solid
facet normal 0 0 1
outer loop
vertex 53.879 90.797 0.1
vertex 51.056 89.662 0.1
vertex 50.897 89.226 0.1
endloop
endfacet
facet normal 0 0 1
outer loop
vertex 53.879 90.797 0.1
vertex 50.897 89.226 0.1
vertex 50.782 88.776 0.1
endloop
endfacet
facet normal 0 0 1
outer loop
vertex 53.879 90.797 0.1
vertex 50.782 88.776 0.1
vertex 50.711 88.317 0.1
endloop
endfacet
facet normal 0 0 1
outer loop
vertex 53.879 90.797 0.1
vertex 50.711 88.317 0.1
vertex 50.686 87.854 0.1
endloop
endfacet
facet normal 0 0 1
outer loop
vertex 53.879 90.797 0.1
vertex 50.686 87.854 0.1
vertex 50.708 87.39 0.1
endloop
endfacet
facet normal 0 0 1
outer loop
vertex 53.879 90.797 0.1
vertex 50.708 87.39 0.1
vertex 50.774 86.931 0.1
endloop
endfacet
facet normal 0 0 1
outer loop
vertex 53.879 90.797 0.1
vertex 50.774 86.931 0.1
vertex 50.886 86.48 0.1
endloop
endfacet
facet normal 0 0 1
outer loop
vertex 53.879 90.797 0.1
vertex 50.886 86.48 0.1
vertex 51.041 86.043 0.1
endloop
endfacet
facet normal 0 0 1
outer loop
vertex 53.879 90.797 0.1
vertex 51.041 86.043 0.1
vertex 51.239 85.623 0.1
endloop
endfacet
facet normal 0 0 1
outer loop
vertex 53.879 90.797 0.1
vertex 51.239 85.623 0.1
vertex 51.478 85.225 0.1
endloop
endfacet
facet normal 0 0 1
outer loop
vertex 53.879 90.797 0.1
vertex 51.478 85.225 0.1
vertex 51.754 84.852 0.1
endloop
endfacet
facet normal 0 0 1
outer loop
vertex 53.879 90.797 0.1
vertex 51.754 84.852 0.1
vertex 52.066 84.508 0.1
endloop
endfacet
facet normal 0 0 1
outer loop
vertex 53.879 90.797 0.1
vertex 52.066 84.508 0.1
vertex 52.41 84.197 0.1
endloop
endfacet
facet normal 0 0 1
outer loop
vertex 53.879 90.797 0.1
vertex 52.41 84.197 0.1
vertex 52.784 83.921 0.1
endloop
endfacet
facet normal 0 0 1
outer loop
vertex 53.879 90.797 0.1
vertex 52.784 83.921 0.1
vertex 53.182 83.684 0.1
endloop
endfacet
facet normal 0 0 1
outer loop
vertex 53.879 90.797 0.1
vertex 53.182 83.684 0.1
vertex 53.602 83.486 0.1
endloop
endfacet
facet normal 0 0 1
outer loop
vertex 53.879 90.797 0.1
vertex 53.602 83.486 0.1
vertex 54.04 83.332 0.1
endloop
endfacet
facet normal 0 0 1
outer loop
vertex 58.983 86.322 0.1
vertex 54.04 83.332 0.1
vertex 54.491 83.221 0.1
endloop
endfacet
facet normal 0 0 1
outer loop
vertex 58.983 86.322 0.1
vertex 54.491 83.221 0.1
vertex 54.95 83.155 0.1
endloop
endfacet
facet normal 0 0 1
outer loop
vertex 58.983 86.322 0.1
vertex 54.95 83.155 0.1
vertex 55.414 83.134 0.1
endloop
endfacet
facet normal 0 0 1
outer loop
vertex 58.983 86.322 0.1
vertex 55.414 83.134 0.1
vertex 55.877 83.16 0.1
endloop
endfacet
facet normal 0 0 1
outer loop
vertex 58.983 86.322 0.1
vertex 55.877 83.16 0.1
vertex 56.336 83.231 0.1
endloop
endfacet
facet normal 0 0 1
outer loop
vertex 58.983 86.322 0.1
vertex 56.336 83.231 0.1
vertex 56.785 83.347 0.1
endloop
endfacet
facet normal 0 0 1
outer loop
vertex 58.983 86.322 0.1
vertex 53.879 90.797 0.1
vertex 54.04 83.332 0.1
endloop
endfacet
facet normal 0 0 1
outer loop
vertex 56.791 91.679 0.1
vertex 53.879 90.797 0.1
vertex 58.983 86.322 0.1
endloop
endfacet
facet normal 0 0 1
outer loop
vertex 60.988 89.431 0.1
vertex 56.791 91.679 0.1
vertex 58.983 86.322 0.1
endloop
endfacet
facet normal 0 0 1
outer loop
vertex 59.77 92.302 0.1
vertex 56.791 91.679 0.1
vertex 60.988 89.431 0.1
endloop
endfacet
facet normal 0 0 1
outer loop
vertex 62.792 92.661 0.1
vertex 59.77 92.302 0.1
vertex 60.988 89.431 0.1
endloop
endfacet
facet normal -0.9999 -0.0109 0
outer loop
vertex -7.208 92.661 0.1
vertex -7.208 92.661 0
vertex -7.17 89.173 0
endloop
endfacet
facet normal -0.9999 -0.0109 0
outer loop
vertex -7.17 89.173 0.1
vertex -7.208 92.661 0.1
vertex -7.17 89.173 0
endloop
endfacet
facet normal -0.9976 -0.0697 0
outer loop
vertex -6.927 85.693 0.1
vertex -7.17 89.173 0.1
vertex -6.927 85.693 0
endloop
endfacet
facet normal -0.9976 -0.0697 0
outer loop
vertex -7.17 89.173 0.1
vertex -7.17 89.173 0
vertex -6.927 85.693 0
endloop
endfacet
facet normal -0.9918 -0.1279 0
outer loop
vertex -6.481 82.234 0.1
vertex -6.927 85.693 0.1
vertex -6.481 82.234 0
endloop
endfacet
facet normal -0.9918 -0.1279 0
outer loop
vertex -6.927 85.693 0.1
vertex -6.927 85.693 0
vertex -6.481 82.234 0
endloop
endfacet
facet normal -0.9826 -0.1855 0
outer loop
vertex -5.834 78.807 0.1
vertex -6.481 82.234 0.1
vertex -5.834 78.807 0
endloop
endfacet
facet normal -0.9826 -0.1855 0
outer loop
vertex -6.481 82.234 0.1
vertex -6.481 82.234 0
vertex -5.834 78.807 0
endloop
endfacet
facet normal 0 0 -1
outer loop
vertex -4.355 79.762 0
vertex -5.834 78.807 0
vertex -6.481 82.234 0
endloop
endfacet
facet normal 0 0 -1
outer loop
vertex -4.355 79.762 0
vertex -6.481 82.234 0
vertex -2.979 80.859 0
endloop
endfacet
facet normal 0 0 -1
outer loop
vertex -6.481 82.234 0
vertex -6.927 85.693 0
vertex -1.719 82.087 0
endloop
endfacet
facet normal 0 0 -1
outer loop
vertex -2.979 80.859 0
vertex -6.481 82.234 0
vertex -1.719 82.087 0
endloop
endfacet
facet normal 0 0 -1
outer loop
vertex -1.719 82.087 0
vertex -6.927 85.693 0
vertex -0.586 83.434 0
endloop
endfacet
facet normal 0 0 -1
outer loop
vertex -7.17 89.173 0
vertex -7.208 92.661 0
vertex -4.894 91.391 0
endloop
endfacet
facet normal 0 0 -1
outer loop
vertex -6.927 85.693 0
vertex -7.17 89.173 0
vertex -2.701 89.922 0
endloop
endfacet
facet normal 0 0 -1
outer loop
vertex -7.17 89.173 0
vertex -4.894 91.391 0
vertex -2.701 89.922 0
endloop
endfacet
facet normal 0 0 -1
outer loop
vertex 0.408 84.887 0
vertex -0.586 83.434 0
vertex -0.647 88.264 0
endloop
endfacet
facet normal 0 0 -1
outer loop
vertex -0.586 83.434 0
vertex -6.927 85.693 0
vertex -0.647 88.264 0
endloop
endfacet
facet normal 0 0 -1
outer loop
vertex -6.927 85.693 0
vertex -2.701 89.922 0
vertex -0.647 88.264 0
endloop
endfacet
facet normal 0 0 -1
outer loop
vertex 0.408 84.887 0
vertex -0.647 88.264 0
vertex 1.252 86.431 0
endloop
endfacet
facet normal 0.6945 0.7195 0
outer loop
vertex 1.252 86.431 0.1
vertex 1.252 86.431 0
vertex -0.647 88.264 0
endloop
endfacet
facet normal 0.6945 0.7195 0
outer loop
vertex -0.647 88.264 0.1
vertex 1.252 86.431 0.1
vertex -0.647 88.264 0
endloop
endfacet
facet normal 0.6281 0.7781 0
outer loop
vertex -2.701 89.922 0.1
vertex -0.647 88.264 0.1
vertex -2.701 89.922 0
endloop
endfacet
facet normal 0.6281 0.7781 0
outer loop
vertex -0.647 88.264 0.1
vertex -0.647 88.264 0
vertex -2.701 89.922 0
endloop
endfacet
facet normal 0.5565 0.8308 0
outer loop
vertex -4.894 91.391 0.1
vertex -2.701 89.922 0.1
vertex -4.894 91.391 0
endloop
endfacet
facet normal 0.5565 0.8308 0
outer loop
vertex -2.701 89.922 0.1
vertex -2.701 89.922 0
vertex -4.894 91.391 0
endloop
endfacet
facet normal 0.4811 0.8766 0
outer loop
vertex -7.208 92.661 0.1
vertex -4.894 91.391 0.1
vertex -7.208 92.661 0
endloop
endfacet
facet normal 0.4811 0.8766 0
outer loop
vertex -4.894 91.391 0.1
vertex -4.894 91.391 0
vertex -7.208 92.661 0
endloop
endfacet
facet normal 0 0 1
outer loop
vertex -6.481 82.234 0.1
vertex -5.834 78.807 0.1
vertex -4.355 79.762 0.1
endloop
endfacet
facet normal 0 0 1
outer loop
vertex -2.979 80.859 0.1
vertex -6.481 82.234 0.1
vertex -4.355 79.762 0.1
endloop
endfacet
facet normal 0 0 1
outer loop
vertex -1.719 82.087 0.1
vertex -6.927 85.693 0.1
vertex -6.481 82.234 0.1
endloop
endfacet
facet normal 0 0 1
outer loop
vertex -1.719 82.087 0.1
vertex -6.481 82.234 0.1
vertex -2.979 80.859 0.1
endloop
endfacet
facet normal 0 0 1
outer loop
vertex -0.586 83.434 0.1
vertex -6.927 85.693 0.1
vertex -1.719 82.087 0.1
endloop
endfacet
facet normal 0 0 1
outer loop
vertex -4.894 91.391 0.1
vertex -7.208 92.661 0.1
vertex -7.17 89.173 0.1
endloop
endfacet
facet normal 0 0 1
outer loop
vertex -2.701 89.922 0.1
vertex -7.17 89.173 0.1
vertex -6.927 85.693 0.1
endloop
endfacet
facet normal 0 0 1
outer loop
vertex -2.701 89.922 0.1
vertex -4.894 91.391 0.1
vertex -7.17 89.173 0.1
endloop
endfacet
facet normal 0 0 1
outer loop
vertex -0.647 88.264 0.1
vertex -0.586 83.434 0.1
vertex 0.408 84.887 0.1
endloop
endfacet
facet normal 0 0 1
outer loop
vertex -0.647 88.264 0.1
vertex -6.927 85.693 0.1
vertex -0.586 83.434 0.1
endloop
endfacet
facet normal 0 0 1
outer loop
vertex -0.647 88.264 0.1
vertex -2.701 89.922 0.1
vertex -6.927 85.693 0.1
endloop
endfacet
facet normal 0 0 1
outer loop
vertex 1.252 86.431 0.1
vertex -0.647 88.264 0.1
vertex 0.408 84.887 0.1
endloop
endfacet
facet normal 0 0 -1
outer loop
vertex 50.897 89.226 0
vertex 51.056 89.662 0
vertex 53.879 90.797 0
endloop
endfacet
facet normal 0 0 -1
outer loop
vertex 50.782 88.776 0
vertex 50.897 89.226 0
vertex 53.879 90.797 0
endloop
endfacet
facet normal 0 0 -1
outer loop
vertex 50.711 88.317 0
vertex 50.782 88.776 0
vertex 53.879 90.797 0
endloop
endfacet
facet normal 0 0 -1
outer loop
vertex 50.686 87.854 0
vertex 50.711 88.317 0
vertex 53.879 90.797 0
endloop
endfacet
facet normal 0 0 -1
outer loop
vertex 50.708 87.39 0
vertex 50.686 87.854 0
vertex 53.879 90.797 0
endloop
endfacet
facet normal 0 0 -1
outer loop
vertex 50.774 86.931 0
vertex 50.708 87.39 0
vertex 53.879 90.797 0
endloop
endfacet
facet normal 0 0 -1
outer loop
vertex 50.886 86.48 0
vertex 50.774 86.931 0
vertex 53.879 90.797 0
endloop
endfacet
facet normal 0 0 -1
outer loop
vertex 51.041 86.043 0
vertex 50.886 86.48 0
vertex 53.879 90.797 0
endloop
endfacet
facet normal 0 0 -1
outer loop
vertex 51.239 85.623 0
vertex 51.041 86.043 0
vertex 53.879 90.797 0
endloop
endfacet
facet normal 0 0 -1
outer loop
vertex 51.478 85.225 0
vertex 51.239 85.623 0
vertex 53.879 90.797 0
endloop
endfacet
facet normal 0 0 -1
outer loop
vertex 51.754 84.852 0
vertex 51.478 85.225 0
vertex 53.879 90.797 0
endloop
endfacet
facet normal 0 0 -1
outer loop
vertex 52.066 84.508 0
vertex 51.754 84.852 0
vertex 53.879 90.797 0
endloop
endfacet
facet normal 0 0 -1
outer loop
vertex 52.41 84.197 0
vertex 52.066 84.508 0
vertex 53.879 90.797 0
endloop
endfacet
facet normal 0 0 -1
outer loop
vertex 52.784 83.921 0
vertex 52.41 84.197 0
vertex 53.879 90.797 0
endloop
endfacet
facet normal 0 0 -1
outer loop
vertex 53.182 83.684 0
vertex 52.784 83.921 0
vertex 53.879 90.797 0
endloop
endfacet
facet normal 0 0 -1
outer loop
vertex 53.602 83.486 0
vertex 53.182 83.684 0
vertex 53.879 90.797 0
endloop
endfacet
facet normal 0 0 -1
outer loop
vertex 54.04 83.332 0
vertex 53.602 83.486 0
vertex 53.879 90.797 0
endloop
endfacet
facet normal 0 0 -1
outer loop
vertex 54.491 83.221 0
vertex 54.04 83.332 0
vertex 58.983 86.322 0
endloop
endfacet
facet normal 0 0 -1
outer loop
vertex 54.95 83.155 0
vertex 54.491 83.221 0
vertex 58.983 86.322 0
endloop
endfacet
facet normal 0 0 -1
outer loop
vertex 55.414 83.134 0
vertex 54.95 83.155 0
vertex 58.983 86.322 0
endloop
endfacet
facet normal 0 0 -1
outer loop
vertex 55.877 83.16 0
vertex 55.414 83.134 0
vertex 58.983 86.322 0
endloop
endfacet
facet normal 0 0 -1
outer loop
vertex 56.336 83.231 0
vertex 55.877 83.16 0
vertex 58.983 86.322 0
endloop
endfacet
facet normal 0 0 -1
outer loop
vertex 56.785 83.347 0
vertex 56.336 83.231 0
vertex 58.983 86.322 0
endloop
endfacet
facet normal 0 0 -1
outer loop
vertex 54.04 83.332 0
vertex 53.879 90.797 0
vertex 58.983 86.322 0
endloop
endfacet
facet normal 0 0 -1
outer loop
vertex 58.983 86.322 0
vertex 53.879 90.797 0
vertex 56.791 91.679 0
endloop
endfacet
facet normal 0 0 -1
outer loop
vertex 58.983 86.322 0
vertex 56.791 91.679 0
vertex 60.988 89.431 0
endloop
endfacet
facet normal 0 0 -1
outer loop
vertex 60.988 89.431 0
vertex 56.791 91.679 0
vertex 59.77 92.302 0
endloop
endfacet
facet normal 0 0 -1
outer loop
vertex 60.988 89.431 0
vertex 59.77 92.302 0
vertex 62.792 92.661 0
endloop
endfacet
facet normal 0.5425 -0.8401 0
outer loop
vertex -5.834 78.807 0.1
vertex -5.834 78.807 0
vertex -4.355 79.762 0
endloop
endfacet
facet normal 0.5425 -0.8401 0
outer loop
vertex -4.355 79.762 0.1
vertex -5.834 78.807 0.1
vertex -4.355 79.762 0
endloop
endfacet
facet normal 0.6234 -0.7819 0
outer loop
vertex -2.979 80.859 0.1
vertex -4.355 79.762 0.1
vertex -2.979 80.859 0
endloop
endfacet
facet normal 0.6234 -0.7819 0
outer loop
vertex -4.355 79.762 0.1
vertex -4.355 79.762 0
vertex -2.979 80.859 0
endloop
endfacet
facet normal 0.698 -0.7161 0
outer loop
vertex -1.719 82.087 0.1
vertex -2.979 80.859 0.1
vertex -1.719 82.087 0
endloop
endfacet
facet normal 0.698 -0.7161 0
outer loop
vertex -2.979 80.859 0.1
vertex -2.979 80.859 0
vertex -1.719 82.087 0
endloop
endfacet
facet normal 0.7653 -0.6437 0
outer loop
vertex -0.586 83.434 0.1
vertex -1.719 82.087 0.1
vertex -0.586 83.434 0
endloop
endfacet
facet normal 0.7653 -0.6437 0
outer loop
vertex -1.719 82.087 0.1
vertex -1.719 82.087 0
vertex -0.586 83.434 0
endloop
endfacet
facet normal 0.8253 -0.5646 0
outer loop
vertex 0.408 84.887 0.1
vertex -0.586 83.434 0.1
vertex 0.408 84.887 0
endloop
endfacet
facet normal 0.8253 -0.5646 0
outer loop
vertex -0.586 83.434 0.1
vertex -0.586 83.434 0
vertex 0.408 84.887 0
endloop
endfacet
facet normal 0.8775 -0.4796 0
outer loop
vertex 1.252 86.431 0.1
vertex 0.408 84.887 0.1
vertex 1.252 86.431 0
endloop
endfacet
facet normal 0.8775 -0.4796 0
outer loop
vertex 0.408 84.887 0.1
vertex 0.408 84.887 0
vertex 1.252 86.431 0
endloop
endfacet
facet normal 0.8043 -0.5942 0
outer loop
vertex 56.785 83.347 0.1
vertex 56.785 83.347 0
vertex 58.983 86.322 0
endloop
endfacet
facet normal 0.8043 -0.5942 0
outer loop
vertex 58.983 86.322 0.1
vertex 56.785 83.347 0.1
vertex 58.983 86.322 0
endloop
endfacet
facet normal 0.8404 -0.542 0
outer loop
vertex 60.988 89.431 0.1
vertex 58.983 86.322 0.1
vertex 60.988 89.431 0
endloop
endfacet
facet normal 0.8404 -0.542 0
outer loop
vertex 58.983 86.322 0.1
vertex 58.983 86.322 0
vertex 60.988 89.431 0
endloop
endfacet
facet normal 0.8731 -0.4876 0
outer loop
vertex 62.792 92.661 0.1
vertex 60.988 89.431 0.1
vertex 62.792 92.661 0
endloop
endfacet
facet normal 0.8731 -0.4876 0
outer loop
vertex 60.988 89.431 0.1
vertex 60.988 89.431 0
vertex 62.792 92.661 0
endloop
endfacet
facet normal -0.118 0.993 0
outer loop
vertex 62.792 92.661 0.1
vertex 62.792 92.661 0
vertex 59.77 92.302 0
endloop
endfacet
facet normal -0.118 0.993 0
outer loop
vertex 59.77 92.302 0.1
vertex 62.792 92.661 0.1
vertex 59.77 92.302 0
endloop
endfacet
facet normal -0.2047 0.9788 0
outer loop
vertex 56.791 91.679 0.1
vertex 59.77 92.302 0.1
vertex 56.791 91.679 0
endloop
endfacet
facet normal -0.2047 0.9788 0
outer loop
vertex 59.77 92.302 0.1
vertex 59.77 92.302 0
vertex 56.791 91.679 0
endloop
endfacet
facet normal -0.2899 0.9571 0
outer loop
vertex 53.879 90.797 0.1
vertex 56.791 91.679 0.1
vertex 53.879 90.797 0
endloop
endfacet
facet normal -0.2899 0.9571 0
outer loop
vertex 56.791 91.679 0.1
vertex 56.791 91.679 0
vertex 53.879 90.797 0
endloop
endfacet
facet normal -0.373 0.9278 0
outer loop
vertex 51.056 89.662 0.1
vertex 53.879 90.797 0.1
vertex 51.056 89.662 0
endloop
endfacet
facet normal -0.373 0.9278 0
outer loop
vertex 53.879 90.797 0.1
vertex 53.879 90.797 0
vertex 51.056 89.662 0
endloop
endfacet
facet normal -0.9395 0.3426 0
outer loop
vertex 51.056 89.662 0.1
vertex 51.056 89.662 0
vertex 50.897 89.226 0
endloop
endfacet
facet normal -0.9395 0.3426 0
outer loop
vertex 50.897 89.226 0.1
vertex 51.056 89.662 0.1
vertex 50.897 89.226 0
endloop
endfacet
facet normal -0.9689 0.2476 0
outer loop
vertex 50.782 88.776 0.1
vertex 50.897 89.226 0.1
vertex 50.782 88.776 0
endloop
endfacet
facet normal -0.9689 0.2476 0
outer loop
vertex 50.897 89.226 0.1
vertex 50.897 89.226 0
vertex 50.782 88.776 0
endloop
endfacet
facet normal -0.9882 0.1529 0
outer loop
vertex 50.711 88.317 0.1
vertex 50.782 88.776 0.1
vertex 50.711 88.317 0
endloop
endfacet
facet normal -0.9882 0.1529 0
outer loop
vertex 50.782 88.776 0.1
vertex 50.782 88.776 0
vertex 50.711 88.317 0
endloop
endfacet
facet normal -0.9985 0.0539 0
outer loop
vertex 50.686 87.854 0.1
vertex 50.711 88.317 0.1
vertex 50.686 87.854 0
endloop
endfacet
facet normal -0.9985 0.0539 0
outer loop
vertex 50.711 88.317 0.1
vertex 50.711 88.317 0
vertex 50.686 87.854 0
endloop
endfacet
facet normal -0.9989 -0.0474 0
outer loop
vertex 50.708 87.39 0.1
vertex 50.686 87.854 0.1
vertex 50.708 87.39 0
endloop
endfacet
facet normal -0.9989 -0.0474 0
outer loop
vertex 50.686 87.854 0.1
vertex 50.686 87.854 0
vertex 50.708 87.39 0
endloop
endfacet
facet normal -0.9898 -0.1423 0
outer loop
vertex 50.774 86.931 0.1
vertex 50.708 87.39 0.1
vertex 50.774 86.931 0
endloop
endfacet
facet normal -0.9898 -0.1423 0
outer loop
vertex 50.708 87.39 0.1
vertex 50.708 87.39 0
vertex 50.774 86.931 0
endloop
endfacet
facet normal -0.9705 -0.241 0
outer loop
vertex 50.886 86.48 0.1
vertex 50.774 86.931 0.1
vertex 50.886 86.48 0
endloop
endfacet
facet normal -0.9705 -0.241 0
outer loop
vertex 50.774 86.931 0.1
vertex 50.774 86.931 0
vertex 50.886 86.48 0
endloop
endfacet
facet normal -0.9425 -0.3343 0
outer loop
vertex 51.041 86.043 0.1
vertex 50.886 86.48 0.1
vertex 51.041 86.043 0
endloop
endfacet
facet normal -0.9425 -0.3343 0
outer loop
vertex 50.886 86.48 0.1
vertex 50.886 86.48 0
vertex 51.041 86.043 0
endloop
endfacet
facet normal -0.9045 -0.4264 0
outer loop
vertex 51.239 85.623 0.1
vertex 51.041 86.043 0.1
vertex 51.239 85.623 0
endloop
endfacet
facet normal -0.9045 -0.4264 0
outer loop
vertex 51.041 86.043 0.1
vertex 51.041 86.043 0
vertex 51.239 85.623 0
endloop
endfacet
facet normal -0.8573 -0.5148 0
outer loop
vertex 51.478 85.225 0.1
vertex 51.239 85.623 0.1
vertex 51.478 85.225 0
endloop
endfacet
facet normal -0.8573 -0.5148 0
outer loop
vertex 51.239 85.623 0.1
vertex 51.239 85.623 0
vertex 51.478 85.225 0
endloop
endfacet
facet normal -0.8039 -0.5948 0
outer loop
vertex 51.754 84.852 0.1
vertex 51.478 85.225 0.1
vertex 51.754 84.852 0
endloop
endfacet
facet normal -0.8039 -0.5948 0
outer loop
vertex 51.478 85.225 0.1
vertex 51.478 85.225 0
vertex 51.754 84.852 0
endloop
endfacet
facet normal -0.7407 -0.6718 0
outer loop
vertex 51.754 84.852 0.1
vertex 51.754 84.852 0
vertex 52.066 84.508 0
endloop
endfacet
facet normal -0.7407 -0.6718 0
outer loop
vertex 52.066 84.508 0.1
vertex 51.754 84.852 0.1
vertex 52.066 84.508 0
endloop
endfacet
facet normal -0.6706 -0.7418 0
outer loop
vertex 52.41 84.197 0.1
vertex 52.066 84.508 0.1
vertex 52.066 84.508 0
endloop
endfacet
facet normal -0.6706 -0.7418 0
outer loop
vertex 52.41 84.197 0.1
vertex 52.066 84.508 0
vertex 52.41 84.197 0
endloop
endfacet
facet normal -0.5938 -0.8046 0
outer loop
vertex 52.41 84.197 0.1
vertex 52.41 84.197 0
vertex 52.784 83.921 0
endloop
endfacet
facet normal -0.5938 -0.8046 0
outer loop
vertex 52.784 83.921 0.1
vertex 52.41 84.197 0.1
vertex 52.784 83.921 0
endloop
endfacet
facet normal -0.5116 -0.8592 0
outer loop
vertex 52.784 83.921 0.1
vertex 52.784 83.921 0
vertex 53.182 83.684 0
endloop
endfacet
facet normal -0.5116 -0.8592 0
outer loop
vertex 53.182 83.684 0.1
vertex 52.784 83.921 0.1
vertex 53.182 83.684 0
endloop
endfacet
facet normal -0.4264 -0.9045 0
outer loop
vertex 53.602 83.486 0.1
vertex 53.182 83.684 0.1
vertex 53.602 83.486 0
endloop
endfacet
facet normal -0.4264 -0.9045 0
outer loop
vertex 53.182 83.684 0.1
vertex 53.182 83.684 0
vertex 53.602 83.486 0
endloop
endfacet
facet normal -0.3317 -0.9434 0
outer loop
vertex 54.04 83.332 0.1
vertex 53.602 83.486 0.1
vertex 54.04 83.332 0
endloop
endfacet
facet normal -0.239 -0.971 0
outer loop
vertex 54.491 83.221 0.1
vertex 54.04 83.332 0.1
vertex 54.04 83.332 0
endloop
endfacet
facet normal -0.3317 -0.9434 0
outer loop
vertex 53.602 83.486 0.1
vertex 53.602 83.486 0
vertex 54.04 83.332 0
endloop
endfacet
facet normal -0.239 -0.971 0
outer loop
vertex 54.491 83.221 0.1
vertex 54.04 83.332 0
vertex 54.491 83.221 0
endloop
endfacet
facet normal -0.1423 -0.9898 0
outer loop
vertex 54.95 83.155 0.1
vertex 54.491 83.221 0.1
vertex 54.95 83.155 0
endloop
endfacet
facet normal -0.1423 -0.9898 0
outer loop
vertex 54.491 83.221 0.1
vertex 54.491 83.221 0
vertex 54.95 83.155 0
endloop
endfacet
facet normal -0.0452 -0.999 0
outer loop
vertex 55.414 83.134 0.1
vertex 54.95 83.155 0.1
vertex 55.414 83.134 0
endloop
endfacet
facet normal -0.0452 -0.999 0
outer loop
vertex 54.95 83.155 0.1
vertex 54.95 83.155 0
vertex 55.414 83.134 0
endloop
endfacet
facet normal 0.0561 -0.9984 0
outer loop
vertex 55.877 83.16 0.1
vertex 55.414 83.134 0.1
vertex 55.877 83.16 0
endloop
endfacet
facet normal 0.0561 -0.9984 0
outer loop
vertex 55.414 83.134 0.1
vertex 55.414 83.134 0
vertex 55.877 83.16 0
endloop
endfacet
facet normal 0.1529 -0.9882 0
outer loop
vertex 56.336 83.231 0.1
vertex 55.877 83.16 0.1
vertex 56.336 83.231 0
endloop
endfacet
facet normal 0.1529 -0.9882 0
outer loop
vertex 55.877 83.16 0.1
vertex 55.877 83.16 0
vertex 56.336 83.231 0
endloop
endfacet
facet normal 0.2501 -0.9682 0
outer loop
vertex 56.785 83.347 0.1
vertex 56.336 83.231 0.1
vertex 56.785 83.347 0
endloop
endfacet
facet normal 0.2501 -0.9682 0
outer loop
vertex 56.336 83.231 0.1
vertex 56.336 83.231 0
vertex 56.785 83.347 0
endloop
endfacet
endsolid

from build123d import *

# Parameters (mm, degrees)
SALIENTE_EXTRUIR1_DEPTH   = 0.1
SALIENTE_EXTRUIR1_2_DEPTH = 0.1


with BuildPart() as part:
    # Model → Saliente-Extruir1 (new body)
    with BuildSketch(Plane.XY):
        with BuildLine():
            ThreePointArc((56.7853139, 83.347070157), (60.010011193, 87.860883314), (62.79150044, 92.660518656))
            ThreePointArc((62.79150044, 92.660518656), (56.791217612, 91.679294852), (51.055795467, 89.661591454))
            ThreePointArc((51.055795467, 89.661591454), (51.905913993, 84.6763346), (56.7853139, 83.347070157))
        make_face()
    extrude(amount=SALIENTE_EXTRUIR1_DEPTH)


with BuildPart() as body_2:
    # Model → Saliente-Extruir1 2 (new body)
    with BuildSketch(Plane.XY):
        with BuildLine():
            ThreePointArc((1.252486962, 86.430906166), (-2.701090718, 89.9218159), (-7.20849956, 92.660518656))
            ThreePointArc((-7.20849956, 92.660518656), (-6.926809654, 85.693416928), (-5.833511394, 78.806868111))
            ThreePointArc((-5.833511394, 78.806868111), (-1.718584289, 82.087321015), (1.252486962, 86.430906166))
        make_face()
    extrude(amount=SALIENTE_EXTRUIR1_2_DEPTH)


solid = Compound([part.part, body_2.part])
